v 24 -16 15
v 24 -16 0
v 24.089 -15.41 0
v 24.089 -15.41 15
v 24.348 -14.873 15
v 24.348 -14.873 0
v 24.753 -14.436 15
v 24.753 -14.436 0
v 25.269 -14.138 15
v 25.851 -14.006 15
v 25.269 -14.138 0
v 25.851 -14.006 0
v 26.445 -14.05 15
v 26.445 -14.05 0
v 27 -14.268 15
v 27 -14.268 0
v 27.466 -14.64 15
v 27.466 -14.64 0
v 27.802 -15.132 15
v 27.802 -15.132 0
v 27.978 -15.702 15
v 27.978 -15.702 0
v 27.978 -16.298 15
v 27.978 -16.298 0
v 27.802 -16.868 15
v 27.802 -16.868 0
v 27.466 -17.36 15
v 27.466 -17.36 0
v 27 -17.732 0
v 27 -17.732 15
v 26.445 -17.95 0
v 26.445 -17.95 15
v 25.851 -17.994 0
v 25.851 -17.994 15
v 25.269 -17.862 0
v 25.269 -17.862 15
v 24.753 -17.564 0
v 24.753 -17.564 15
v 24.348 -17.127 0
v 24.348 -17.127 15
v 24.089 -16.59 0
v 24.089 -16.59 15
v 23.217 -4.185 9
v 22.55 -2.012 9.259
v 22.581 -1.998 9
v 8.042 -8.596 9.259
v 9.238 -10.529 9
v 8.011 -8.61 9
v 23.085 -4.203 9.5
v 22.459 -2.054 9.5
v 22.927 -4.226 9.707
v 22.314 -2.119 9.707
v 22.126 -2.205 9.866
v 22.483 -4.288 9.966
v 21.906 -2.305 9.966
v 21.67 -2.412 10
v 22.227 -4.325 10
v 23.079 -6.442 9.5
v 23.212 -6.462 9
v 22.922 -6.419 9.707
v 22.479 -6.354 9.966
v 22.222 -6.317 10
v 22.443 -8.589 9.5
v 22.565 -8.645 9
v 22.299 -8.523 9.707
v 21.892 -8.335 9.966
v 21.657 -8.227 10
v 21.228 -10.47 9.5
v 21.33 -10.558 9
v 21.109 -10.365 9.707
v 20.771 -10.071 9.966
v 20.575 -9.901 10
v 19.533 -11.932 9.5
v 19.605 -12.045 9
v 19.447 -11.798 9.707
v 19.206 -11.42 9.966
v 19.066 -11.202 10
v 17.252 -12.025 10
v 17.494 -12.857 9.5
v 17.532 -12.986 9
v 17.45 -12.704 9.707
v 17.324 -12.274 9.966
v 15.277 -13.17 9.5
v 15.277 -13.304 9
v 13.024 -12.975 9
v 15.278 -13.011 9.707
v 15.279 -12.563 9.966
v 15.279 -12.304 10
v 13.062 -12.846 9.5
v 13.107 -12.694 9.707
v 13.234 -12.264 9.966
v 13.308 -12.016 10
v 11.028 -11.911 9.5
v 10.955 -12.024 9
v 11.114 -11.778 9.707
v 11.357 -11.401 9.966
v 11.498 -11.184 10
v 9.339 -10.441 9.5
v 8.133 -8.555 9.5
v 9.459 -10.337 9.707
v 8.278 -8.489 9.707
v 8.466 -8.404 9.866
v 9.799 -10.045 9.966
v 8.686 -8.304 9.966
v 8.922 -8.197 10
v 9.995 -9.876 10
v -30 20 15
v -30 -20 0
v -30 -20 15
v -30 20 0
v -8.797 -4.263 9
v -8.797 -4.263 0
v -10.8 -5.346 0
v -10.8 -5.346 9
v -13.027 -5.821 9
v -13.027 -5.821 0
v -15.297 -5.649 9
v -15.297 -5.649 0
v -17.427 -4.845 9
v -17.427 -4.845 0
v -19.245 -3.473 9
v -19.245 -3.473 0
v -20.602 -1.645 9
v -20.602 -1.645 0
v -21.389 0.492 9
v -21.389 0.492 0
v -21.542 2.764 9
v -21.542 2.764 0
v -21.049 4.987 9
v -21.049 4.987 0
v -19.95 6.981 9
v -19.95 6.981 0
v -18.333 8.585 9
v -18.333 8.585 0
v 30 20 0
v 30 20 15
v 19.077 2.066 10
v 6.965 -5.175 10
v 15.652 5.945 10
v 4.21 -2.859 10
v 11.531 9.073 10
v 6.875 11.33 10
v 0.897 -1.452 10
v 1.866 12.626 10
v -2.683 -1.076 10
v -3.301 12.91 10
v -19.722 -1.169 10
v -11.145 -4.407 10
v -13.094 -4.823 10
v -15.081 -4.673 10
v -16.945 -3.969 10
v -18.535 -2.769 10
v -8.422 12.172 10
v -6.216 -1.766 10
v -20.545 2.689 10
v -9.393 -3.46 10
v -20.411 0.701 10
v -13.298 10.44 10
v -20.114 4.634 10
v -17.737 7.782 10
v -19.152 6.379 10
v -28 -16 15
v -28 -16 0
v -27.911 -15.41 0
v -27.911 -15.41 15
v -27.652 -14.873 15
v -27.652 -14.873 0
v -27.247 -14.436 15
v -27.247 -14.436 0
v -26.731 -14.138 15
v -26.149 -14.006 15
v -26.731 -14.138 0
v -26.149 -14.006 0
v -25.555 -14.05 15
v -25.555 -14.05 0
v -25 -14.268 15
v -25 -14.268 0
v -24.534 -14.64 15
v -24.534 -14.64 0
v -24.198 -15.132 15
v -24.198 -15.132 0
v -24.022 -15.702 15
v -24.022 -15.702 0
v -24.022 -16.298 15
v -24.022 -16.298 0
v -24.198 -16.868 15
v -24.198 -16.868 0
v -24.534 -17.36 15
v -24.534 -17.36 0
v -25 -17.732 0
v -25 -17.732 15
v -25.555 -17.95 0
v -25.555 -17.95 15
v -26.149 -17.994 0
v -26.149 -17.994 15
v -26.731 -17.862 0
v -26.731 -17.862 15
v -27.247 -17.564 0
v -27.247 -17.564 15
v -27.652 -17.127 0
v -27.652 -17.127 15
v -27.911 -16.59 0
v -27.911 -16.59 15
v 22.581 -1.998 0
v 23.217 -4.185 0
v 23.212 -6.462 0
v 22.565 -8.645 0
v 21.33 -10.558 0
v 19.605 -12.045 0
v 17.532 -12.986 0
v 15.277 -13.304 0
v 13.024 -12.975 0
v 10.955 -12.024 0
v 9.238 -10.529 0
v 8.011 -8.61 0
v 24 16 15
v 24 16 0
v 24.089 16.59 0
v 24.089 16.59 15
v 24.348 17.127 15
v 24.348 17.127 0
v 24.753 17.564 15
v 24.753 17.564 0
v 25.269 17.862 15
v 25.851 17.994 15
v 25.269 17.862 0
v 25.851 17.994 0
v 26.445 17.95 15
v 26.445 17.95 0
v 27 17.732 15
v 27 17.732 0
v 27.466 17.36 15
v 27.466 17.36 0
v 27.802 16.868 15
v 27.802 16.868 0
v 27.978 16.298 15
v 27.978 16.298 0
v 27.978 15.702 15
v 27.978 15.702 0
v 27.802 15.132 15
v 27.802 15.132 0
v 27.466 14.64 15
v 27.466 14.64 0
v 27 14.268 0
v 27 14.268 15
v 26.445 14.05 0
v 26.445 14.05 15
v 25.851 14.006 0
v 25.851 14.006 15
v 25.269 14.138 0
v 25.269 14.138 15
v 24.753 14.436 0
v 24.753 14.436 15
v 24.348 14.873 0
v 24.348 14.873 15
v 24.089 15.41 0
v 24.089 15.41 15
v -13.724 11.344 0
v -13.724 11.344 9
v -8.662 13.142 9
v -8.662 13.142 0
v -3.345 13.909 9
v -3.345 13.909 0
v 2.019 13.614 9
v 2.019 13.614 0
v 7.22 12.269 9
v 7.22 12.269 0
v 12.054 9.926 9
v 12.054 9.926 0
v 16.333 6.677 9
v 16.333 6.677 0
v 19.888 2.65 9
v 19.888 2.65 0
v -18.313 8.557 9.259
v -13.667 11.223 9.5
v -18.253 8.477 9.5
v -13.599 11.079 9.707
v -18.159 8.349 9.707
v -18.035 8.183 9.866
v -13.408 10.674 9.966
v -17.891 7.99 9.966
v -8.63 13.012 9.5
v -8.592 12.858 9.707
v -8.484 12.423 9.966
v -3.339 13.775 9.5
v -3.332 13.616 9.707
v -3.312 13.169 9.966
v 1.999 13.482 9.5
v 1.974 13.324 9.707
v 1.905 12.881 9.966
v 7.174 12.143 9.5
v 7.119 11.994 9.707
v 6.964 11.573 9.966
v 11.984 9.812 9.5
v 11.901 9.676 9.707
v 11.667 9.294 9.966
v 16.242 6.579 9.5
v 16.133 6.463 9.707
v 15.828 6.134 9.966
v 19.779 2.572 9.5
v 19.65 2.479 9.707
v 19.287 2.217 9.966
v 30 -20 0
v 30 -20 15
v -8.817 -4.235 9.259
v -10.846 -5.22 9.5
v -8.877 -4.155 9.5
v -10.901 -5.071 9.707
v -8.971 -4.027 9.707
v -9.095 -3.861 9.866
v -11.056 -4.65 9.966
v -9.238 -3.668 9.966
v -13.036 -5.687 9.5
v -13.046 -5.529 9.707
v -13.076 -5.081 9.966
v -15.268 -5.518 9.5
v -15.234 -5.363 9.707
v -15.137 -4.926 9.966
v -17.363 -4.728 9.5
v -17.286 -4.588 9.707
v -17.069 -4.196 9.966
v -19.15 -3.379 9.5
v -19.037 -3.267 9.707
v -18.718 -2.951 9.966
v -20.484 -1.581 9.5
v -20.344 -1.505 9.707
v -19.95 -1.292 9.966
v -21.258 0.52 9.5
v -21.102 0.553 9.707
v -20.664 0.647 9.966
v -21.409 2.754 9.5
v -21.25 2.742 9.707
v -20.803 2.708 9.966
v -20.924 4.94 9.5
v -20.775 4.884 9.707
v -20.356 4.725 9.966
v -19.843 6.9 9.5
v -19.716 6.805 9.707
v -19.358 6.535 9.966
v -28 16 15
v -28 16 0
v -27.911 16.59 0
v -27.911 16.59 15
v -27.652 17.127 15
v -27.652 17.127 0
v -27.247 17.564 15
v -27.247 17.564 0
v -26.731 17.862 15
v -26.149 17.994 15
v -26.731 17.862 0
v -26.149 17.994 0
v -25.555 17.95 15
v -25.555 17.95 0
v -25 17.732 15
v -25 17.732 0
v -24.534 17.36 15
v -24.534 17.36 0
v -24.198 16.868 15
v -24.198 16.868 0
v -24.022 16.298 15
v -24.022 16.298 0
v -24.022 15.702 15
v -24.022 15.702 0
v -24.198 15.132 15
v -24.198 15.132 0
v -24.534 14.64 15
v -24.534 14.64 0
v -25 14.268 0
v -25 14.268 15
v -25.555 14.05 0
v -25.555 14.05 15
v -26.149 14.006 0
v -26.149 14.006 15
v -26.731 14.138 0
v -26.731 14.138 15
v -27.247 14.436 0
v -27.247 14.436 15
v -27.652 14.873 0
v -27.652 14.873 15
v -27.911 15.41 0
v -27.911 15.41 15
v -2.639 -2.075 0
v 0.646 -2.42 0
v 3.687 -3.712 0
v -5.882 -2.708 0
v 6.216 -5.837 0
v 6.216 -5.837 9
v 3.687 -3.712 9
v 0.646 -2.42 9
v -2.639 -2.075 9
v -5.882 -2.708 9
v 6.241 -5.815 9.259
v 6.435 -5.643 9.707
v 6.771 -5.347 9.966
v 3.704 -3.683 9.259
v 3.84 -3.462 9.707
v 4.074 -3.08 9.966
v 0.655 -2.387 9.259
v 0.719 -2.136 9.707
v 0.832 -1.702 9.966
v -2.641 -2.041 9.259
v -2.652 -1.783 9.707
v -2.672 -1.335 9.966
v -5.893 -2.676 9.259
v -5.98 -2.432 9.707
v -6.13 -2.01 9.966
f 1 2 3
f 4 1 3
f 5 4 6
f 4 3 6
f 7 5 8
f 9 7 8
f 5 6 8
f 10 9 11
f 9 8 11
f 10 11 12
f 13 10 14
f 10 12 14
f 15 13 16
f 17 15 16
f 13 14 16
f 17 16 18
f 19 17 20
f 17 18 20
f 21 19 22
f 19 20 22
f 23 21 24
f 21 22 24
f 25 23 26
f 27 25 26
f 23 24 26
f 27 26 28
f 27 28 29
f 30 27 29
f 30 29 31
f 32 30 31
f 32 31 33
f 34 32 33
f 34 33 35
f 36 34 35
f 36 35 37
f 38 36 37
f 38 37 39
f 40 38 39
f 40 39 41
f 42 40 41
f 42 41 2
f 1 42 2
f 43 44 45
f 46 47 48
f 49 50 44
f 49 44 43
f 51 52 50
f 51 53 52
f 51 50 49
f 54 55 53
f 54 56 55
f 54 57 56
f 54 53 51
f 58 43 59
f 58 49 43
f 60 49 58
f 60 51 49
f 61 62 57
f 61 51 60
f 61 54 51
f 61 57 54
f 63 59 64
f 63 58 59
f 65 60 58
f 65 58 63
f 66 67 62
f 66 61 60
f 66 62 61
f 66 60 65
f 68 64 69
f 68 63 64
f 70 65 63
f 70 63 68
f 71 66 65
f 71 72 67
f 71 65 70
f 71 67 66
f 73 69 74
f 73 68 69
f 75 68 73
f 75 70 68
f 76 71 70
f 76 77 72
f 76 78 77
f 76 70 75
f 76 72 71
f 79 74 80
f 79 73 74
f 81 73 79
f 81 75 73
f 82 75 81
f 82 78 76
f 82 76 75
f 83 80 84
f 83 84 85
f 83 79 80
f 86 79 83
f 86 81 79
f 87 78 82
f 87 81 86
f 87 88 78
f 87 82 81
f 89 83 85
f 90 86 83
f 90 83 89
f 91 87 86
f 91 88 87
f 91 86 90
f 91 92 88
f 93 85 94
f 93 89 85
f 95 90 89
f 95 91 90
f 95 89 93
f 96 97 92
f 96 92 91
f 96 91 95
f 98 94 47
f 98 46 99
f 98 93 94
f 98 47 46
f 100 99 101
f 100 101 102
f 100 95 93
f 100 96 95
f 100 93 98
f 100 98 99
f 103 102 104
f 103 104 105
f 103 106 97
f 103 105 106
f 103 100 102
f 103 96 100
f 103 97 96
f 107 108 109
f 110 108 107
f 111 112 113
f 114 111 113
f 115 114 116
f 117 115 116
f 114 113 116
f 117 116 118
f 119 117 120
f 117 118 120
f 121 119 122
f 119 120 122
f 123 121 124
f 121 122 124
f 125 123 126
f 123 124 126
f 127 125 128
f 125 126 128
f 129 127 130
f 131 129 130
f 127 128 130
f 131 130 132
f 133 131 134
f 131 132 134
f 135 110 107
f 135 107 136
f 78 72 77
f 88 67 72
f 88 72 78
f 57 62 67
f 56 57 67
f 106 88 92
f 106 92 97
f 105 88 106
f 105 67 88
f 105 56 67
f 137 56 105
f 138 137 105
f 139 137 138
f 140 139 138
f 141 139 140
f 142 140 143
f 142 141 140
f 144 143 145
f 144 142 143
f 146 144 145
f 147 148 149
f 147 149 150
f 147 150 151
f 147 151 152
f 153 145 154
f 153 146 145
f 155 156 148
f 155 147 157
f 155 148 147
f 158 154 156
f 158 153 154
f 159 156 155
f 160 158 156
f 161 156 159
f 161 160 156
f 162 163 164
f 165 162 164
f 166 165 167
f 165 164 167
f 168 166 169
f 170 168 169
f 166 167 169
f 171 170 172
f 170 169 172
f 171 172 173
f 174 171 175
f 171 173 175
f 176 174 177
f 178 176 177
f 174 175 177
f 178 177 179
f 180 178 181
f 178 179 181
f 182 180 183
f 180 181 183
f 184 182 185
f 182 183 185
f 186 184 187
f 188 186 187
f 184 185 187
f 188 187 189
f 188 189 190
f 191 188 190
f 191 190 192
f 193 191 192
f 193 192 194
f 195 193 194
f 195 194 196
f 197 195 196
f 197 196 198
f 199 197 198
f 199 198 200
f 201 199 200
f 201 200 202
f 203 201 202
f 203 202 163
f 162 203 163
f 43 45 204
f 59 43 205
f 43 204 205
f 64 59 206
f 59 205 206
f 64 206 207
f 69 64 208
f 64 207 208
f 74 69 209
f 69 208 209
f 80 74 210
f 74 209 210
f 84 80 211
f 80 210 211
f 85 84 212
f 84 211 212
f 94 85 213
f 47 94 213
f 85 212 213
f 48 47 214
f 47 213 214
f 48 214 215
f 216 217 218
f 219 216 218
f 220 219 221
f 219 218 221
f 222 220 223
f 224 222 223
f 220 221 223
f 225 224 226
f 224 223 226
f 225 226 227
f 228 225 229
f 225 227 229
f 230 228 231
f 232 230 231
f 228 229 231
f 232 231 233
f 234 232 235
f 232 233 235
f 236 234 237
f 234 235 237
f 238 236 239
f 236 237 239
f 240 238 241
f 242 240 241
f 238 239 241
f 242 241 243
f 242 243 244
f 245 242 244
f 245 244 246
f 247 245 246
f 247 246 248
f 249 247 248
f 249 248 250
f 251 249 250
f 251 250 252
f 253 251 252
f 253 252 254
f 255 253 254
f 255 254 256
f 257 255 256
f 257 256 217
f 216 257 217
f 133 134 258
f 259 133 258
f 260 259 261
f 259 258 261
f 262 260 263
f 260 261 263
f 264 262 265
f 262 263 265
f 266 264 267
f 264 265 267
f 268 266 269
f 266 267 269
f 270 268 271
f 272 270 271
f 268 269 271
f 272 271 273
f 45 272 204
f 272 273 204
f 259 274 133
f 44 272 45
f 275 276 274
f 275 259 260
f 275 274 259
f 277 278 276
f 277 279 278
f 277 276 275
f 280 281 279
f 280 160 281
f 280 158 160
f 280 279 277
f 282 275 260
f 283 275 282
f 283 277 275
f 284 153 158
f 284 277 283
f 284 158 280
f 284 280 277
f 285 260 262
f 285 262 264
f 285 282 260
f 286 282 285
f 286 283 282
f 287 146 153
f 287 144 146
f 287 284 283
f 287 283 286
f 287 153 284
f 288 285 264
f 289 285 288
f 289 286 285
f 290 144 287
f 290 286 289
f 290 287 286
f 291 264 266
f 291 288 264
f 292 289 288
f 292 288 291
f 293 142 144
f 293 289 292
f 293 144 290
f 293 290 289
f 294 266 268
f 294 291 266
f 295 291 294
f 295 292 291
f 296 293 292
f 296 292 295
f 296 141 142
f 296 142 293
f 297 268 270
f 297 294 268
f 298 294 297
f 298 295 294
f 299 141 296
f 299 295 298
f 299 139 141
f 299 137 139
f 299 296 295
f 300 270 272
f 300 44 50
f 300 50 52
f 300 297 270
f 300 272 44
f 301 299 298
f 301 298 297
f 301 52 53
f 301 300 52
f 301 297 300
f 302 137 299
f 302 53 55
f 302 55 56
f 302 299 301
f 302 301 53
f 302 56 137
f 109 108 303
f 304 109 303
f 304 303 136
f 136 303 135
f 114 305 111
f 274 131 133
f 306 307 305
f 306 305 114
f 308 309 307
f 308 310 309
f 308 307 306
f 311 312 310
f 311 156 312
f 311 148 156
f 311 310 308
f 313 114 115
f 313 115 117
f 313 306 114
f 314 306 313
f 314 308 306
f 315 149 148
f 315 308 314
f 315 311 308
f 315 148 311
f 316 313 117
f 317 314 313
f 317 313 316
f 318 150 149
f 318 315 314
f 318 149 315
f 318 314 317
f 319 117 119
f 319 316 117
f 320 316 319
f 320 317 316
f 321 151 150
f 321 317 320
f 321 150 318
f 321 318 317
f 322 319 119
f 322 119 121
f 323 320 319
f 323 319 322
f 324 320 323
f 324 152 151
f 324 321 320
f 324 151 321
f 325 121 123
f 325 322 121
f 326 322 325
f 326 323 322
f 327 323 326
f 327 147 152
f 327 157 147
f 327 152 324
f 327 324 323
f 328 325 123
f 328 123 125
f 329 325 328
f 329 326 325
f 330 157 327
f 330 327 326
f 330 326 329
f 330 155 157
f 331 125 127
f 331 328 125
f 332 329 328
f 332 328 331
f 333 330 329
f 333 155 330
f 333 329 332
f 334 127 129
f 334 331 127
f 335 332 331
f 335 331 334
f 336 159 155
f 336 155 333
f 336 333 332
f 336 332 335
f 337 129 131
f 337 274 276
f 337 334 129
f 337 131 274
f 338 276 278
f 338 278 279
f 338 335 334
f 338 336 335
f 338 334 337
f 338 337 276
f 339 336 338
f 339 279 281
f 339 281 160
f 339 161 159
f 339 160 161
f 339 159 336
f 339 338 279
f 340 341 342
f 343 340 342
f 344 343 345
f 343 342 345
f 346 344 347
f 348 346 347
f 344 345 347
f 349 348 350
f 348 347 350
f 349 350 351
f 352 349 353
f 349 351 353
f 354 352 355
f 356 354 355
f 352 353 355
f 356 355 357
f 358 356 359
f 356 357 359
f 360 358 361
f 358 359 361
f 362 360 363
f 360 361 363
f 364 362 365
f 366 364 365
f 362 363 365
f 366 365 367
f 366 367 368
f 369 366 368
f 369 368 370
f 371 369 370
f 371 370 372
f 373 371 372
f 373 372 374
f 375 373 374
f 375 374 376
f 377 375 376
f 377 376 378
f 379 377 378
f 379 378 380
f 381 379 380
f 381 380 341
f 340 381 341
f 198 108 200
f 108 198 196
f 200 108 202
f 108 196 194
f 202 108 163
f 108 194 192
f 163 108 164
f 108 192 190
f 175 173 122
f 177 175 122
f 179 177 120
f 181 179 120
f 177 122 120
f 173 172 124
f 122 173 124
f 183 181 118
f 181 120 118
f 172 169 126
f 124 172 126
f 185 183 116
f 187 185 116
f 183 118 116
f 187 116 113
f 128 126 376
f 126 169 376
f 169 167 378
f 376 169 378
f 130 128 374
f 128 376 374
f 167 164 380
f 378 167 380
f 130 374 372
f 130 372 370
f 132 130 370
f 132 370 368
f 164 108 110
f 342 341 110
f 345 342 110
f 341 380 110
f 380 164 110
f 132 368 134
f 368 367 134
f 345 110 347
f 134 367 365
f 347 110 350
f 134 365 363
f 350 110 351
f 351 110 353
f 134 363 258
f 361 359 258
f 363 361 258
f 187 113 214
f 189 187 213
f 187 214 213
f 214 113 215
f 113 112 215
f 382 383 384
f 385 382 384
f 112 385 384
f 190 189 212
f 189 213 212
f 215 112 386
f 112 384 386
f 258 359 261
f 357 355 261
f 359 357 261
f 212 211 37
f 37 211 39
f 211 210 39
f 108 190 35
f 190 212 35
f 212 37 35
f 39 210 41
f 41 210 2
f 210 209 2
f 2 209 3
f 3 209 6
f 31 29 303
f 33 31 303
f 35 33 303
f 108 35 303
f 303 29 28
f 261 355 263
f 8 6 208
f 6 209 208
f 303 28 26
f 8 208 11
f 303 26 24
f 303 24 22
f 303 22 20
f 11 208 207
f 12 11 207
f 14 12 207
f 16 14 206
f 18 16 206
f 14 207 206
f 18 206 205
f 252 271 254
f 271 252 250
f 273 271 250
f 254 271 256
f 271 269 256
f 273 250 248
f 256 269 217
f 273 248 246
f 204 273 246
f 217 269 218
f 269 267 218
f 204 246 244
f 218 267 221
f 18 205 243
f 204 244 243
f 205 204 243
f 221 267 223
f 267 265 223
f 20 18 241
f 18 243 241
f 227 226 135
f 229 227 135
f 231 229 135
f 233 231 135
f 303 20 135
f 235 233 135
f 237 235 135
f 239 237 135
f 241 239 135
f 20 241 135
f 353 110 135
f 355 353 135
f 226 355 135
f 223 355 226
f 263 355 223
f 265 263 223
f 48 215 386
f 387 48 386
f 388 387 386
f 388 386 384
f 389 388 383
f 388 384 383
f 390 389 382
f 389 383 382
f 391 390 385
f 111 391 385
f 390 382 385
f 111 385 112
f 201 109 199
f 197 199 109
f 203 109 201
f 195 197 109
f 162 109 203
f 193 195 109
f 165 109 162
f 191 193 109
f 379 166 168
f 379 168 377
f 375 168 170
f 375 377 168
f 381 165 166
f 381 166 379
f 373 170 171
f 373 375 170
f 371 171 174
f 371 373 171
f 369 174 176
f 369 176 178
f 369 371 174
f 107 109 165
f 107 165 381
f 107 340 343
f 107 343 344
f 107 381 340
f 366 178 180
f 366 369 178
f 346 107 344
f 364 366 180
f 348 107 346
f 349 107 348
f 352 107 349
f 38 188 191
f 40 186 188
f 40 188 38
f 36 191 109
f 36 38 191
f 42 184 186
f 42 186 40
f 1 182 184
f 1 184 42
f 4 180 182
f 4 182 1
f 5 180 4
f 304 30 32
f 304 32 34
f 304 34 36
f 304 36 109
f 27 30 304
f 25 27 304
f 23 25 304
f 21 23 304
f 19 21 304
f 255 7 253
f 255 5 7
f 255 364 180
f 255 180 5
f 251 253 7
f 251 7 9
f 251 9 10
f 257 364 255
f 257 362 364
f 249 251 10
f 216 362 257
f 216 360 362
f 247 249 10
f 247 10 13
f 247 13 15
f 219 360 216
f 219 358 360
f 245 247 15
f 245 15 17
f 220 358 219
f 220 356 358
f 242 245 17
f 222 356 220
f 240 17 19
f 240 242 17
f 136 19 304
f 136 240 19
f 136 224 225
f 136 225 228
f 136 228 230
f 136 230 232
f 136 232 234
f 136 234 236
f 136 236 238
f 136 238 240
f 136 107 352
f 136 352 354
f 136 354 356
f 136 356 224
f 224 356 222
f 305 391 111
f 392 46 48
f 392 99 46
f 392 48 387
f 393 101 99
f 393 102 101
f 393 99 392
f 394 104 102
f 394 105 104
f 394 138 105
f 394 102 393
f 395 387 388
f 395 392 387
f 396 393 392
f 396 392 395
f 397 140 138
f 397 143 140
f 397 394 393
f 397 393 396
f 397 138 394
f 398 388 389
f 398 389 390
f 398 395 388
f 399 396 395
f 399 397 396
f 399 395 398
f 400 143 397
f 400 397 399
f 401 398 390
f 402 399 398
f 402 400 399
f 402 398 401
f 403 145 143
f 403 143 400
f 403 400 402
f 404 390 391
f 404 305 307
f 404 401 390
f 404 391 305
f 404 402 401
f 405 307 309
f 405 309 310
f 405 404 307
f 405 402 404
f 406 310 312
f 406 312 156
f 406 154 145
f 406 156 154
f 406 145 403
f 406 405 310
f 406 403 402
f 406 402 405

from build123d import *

# Parameters (mm, degrees)
ESQUISSE1_W             = 60
ESQUISSE1_H             = 40
BOSS_EXTRU_1_DEPTH      = 15
ESQUISSE3_R             = 2
ENL_V_MAT_EXTRU_1_DEPTH = 25
ENL_V_MAT_EXTRU_2_DEPTH = 10
CONG_1_R                = 1


with BuildPart() as part:
    # Esquisse1 → Boss.-Extru.1 (new body)
    with BuildSketch(Plane.XY):
        Rectangle(ESQUISSE1_W, ESQUISSE1_H)
    extrude(amount=BOSS_EXTRU_1_DEPTH)

    # Esquisse3 → Enlèv. mat.-Extru.1 (cut)
    with BuildSketch(Plane(origin=(0, 0, 0), x_dir=(-1, 0, 0), z_dir=(0, 0, -1))):
        with Locations((-26, 16)):
            Circle(ESQUISSE3_R)
        with Locations((26, 16)):
            Circle(ESQUISSE3_R)
        with Locations((-26, -16)):
            Circle(ESQUISSE3_R)
        with Locations((26, -16)):
            Circle(ESQUISSE3_R)
    extrude(amount=-ENL_V_MAT_EXTRU_1_DEPTH, mode=Mode.SUBTRACT)

    # Esquisse4 → Enlèv. mat.-Extru.2 (cut)
    with BuildSketch(Plane(origin=(0, 0, 0), x_dir=(-1, 0, 0), z_dir=(0, 0, -1))):
        with BuildLine():
            ThreePointArc((18.333200892, 8.584679084), (-4.652870853, 13.070183937), (-22.581024868, -1.998344249))
            ThreePointArc((-22.581024868, -1.998344249), (-18.601997418, -12.58925264), (-8.011089026, -8.61022519))
            ThreePointArc((-8.011089026, -8.61022519), (-0.646121832, -2.420005289), (8.796660967, -4.26267108))
            ThreePointArc((8.796660967, -4.26267108), (19.988606012, -2.607265961), (18.333200892, 8.584679084))
        make_face()
    extrude(amount=-ENL_V_MAT_EXTRU_2_DEPTH, mode=Mode.SUBTRACT)

    # Congé1
    cong_1_edges = [part.edges().sort_by_distance(p)[0] for p in [
        (-19.988606012, -2.607265961, 10),
        (0.646121832, -2.420005289, 10),
        (18.601997418, -12.58925264, 10),
        (4.652870853, 13.070183937, 10),
    ]]
    fillet(cong_1_edges, radius=CONG_1_R)


solid = part.part
